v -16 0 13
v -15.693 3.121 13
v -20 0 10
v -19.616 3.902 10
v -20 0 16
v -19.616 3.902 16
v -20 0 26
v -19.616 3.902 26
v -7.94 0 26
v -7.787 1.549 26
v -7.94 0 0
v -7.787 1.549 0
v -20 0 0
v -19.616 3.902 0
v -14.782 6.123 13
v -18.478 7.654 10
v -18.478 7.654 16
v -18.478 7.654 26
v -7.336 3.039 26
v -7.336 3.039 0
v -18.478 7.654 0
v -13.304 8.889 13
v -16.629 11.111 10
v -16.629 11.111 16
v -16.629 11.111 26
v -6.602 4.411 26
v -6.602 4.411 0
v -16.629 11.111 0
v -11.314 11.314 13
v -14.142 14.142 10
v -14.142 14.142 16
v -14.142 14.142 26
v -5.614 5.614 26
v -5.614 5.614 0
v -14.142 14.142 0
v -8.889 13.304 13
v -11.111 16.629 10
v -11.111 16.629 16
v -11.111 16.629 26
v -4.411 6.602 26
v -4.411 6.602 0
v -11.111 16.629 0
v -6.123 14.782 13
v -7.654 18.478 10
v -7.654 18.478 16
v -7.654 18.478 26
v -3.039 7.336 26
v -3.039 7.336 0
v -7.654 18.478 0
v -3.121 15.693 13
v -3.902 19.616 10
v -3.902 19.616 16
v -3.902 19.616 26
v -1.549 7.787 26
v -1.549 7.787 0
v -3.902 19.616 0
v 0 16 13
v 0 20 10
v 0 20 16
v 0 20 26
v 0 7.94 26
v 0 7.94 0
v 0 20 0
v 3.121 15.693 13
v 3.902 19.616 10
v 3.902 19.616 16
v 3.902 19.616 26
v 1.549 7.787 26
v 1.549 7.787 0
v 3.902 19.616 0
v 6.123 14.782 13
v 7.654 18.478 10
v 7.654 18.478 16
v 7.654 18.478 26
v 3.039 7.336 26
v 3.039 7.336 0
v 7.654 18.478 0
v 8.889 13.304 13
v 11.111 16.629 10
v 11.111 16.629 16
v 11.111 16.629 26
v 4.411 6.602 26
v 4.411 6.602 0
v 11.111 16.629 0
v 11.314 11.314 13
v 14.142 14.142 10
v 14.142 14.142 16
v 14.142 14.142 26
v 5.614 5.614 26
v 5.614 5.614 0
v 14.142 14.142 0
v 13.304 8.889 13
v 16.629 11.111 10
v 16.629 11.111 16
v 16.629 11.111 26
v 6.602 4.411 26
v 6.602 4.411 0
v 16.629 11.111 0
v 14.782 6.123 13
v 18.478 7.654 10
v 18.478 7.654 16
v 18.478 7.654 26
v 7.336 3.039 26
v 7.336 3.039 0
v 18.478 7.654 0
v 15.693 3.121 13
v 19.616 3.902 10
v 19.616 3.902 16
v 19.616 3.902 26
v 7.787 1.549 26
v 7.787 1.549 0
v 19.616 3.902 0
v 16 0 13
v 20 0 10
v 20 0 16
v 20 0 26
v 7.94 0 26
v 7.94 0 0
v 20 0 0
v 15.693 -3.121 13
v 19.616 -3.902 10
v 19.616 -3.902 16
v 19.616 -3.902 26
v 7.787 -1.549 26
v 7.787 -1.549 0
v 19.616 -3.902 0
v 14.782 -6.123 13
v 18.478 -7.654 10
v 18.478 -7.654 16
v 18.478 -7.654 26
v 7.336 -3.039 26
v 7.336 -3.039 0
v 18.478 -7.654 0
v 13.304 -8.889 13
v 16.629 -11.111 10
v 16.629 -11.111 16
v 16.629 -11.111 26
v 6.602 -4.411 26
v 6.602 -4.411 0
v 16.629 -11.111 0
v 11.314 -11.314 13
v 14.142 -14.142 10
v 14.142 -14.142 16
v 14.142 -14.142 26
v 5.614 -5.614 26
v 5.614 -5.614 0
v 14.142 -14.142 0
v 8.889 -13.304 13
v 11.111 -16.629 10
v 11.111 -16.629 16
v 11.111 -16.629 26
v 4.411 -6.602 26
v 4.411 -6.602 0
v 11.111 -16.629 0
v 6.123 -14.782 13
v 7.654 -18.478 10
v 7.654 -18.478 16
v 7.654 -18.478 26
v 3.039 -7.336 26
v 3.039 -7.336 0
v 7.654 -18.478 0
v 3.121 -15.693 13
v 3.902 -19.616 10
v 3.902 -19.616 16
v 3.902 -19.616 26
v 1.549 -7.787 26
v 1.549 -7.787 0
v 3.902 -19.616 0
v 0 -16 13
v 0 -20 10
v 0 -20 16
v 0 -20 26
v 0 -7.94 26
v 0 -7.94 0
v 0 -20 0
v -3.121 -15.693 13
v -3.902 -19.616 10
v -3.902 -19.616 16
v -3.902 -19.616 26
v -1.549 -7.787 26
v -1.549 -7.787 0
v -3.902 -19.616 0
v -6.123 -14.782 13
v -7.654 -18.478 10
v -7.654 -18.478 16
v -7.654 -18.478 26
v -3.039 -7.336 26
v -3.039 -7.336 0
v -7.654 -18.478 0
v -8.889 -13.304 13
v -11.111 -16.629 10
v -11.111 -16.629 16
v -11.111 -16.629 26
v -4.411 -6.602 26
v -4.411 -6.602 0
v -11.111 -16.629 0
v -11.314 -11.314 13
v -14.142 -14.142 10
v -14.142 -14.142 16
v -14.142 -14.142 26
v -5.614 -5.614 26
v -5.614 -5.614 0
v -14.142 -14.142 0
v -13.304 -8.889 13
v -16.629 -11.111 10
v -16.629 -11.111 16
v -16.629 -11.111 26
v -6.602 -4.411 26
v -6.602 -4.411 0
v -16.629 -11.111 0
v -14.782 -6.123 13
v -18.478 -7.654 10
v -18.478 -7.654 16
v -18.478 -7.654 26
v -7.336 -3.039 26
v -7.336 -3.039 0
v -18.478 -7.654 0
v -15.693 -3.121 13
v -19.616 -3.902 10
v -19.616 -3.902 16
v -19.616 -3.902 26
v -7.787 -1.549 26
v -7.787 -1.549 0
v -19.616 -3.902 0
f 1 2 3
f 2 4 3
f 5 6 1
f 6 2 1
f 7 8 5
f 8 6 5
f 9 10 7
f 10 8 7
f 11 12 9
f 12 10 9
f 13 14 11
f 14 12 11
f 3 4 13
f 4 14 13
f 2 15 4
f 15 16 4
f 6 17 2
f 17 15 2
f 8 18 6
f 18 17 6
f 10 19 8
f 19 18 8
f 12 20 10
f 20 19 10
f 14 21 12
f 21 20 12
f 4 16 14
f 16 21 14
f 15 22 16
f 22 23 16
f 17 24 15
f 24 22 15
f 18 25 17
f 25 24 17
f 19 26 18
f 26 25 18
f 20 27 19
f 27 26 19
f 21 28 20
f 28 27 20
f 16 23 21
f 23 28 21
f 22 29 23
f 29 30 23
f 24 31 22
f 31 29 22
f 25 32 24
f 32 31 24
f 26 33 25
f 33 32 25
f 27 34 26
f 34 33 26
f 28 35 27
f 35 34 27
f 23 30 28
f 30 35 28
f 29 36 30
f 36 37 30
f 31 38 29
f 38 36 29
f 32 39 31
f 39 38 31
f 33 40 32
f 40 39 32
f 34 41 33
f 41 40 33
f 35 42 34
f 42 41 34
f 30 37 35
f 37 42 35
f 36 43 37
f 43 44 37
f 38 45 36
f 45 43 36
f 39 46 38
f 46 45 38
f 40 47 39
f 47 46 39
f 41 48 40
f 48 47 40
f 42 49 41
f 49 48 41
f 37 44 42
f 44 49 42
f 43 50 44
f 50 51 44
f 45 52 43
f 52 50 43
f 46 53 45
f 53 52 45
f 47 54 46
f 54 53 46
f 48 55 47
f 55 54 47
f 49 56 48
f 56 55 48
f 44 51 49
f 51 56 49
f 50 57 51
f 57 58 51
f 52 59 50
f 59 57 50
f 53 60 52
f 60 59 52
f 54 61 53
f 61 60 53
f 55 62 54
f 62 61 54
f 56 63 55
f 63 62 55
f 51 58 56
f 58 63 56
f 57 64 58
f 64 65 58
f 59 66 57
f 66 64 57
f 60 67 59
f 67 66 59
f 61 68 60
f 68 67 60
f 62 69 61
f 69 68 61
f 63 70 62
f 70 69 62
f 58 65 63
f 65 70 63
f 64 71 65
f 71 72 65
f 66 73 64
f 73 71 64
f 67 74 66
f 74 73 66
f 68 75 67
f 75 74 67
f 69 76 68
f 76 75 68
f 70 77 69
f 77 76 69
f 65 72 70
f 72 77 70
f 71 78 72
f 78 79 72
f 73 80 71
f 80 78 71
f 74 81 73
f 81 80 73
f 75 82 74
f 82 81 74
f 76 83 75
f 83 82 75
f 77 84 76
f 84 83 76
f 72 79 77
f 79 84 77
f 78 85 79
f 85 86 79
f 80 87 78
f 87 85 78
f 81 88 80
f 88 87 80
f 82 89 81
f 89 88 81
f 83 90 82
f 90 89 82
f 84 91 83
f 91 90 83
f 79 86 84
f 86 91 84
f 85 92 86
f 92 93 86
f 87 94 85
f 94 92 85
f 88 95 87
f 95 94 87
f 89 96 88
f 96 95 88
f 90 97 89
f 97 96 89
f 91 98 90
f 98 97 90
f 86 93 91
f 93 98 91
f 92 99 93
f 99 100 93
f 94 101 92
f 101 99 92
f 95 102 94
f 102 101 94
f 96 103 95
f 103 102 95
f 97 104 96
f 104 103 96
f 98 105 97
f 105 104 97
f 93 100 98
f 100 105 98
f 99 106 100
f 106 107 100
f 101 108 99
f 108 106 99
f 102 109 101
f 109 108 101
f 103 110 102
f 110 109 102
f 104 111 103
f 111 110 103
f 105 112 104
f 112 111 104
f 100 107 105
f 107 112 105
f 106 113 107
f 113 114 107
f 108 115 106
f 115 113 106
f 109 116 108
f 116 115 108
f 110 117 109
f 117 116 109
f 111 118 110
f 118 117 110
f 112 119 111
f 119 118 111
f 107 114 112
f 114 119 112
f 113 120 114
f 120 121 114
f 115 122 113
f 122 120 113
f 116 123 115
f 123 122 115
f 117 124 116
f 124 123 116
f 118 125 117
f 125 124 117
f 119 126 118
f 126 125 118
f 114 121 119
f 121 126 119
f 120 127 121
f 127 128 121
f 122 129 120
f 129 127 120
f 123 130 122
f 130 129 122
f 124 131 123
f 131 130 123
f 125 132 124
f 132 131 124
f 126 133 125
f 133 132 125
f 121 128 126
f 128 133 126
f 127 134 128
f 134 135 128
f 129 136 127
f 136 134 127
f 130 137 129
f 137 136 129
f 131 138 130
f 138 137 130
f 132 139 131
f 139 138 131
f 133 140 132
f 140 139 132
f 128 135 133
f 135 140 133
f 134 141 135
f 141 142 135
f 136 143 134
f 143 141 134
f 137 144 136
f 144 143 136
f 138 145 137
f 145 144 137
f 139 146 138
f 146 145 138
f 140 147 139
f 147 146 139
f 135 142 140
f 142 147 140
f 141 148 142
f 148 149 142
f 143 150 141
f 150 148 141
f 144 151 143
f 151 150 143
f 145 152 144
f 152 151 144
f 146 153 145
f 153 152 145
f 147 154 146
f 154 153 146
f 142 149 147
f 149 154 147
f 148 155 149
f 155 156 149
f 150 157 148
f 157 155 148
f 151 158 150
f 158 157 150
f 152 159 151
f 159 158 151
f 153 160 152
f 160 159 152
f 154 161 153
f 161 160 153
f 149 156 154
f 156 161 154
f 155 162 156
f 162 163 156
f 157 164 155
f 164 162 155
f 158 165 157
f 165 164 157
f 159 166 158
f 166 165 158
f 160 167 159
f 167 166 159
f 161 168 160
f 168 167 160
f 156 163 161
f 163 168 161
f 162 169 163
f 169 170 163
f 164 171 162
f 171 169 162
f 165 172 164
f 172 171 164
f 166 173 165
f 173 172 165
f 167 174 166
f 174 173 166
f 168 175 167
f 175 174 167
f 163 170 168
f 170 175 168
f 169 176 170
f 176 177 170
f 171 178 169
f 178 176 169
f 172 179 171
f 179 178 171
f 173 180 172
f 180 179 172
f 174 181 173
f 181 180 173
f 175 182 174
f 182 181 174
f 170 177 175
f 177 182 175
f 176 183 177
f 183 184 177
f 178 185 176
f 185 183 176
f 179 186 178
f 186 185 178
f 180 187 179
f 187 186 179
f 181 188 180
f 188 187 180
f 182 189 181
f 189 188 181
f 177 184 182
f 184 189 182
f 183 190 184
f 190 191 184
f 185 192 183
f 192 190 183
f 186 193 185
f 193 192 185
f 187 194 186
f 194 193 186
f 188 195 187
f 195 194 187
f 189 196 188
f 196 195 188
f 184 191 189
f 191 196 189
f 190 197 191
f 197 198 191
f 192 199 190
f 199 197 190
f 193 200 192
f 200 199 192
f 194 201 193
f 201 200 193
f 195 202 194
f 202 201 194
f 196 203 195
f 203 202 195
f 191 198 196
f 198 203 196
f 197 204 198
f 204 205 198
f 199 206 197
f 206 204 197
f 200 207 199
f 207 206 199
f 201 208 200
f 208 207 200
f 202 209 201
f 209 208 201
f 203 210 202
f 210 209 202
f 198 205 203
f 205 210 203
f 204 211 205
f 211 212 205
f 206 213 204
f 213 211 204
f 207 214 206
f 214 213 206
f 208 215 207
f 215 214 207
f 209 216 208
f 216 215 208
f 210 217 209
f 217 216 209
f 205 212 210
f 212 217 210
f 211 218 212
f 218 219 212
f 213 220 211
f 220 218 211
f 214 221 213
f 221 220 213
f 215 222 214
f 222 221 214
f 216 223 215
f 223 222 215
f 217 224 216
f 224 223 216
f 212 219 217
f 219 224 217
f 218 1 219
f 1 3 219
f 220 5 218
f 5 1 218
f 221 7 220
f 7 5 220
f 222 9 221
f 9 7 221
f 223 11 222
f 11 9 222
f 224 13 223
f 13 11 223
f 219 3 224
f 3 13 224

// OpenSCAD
$fn = 32;

// ----------------------------------------------------------------------
// Belt roller: 40 mm barrel, 26 mm wide, bore 15.88 mm
// ----------------------------------------------------------------------

// --- parameters (mm) ---
bore_d = 15.88;           // bore
barrel_d = 40;            // barrel diameter
roller_w = 26;            // roller width
groove_w = 6;             // guide groove width
groove_d = 4;             // guide groove depth

roller_profile = [[7.94, 0], [20, 0], [20, 10], [16, 13], [20, 16], [20, 26], [7.94, 26]];

/* the profile stays clear of the axis, so the bore comes out of the revolve */
rotate_extrude() polygon(roller_profile);
